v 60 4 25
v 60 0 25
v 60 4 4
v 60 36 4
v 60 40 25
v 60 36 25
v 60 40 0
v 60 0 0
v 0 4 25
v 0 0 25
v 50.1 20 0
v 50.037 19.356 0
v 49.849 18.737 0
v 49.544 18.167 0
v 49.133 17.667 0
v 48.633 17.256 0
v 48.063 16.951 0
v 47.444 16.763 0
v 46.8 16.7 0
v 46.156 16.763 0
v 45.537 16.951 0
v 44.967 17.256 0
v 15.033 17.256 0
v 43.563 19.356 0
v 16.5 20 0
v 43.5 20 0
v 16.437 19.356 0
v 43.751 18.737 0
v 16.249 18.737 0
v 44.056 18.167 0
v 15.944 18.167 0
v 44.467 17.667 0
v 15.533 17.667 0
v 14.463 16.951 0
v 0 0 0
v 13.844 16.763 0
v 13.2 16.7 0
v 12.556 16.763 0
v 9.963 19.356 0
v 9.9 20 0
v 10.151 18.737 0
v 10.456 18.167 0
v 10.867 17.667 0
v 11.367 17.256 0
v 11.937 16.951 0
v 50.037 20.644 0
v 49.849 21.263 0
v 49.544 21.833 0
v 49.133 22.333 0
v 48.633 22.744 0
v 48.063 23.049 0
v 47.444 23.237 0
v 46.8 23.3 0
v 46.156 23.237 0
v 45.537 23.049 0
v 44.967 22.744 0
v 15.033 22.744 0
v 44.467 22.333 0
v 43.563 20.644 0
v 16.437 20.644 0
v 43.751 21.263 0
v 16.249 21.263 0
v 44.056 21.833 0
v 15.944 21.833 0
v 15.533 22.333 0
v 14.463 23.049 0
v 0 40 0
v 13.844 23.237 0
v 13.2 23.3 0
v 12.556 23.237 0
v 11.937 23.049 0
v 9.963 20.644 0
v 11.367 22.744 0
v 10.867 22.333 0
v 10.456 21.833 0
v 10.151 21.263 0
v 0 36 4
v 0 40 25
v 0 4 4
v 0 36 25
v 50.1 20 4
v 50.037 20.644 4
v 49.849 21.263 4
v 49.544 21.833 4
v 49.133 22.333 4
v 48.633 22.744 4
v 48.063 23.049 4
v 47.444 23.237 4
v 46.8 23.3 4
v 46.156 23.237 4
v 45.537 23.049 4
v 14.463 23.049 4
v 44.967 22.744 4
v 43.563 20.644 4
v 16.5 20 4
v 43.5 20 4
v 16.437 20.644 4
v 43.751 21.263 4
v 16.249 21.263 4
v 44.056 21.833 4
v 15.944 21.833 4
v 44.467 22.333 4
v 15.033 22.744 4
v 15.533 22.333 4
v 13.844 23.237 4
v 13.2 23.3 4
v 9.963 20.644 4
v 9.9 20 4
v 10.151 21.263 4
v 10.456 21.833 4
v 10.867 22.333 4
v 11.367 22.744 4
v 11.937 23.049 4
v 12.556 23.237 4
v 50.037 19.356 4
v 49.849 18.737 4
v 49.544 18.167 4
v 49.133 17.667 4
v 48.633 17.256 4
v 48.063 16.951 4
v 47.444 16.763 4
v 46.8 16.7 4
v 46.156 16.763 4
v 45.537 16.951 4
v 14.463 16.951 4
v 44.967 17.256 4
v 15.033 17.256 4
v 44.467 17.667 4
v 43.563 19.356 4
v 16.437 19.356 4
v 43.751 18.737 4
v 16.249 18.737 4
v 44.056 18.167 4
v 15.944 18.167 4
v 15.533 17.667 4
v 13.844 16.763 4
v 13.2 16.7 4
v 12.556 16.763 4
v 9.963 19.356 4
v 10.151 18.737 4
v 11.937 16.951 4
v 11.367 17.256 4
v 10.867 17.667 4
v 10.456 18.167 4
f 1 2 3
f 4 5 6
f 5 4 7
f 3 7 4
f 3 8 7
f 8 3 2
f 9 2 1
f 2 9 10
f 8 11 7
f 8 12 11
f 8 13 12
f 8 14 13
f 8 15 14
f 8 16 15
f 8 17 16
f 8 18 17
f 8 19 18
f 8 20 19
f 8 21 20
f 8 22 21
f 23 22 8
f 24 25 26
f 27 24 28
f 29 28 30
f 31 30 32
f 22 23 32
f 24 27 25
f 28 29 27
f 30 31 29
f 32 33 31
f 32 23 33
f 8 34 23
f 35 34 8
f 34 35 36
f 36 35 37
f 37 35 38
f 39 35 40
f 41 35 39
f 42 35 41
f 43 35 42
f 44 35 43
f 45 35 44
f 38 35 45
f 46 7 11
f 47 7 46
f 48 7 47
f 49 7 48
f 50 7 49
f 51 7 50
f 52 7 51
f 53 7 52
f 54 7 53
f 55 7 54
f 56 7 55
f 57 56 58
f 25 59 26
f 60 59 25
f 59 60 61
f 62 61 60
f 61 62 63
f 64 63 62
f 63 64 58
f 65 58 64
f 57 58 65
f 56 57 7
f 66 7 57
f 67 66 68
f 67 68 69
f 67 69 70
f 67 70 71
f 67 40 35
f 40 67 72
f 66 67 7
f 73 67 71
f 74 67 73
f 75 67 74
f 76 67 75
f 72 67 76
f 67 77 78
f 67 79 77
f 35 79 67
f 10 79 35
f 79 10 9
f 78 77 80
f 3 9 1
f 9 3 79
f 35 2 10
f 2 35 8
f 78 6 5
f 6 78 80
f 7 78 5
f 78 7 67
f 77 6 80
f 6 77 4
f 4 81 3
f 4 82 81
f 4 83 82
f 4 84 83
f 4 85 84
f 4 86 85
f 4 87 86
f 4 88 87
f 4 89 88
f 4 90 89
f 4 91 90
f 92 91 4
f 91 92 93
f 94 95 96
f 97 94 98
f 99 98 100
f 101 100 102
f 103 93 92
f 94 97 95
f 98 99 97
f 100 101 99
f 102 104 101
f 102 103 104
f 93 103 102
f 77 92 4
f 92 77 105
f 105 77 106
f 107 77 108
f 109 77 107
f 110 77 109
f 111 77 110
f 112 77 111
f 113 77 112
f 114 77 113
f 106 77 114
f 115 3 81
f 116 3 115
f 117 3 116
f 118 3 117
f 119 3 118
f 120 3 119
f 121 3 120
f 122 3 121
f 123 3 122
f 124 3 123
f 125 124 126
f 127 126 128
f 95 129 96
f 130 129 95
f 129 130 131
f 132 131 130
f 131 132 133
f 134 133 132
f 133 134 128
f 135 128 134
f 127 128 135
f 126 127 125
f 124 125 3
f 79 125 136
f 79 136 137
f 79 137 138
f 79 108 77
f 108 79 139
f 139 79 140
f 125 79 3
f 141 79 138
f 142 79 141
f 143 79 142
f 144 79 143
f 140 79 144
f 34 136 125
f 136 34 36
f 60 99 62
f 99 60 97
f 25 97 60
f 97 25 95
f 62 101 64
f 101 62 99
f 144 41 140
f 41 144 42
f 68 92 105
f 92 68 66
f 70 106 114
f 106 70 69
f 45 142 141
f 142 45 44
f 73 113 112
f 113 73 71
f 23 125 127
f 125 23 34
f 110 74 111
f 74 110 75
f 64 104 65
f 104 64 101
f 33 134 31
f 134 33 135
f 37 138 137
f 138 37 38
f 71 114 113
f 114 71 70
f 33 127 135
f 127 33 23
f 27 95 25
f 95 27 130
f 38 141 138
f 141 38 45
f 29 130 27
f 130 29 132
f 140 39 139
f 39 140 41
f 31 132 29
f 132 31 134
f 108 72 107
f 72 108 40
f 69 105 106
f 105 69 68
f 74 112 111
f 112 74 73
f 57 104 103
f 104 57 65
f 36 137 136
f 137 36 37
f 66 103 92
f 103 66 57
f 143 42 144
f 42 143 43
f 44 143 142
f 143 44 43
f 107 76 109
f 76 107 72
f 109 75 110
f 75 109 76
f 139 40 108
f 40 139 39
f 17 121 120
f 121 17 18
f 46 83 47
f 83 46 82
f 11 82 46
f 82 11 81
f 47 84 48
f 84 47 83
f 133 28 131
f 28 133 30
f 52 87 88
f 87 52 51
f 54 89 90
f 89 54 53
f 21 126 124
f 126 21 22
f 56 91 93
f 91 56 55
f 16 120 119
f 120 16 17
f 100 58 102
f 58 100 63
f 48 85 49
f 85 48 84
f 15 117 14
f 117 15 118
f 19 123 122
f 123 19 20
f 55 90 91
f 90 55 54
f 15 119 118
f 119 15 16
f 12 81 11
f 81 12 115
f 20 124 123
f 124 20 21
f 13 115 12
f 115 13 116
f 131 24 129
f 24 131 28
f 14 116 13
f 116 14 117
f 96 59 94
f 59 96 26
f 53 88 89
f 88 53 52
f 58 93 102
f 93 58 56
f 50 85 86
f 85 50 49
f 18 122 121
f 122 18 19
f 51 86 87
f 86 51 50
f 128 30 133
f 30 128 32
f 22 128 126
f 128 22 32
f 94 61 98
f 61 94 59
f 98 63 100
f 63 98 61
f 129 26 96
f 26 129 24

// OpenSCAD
$fn = 32;

// ----------------------------------------------------------------------
// U-bracket: 60 x 40 x 25 mm
// ----------------------------------------------------------------------

// --- parameters (mm) ---
rail_len = 60;            // outer length, X
jaw_w = 40;               // outer width, Y
jaw_h = 25;               // upright height, Z
web_t = 4;                // wall thickness
hole_d = 6.6;             // clearance for M6

module hole_z(px, py) {
  translate([px, py, -2.5]) cylinder(h = web_t + 5, d = hole_d);
}
module hole_y_pz(pz) {
  /* through both uprights along Y */
  translate([0, -2.5, pz]) rotate([-90, 0, 0]) cylinder(h = jaw_w + 5, d = hole_d);
}

module base() {
  cube([rail_len, jaw_w, web_t]);
}

module uprights() {
  cube([rail_len, web_t, jaw_h]);
  translate([0, jaw_w - web_t, 0]) cube([rail_len, web_t, jaw_h]);
}

difference() {
  union() {
    base();
    uprights();
  }
  hole_z(13.2, 20);
  hole_z(46.8, 20);
}
